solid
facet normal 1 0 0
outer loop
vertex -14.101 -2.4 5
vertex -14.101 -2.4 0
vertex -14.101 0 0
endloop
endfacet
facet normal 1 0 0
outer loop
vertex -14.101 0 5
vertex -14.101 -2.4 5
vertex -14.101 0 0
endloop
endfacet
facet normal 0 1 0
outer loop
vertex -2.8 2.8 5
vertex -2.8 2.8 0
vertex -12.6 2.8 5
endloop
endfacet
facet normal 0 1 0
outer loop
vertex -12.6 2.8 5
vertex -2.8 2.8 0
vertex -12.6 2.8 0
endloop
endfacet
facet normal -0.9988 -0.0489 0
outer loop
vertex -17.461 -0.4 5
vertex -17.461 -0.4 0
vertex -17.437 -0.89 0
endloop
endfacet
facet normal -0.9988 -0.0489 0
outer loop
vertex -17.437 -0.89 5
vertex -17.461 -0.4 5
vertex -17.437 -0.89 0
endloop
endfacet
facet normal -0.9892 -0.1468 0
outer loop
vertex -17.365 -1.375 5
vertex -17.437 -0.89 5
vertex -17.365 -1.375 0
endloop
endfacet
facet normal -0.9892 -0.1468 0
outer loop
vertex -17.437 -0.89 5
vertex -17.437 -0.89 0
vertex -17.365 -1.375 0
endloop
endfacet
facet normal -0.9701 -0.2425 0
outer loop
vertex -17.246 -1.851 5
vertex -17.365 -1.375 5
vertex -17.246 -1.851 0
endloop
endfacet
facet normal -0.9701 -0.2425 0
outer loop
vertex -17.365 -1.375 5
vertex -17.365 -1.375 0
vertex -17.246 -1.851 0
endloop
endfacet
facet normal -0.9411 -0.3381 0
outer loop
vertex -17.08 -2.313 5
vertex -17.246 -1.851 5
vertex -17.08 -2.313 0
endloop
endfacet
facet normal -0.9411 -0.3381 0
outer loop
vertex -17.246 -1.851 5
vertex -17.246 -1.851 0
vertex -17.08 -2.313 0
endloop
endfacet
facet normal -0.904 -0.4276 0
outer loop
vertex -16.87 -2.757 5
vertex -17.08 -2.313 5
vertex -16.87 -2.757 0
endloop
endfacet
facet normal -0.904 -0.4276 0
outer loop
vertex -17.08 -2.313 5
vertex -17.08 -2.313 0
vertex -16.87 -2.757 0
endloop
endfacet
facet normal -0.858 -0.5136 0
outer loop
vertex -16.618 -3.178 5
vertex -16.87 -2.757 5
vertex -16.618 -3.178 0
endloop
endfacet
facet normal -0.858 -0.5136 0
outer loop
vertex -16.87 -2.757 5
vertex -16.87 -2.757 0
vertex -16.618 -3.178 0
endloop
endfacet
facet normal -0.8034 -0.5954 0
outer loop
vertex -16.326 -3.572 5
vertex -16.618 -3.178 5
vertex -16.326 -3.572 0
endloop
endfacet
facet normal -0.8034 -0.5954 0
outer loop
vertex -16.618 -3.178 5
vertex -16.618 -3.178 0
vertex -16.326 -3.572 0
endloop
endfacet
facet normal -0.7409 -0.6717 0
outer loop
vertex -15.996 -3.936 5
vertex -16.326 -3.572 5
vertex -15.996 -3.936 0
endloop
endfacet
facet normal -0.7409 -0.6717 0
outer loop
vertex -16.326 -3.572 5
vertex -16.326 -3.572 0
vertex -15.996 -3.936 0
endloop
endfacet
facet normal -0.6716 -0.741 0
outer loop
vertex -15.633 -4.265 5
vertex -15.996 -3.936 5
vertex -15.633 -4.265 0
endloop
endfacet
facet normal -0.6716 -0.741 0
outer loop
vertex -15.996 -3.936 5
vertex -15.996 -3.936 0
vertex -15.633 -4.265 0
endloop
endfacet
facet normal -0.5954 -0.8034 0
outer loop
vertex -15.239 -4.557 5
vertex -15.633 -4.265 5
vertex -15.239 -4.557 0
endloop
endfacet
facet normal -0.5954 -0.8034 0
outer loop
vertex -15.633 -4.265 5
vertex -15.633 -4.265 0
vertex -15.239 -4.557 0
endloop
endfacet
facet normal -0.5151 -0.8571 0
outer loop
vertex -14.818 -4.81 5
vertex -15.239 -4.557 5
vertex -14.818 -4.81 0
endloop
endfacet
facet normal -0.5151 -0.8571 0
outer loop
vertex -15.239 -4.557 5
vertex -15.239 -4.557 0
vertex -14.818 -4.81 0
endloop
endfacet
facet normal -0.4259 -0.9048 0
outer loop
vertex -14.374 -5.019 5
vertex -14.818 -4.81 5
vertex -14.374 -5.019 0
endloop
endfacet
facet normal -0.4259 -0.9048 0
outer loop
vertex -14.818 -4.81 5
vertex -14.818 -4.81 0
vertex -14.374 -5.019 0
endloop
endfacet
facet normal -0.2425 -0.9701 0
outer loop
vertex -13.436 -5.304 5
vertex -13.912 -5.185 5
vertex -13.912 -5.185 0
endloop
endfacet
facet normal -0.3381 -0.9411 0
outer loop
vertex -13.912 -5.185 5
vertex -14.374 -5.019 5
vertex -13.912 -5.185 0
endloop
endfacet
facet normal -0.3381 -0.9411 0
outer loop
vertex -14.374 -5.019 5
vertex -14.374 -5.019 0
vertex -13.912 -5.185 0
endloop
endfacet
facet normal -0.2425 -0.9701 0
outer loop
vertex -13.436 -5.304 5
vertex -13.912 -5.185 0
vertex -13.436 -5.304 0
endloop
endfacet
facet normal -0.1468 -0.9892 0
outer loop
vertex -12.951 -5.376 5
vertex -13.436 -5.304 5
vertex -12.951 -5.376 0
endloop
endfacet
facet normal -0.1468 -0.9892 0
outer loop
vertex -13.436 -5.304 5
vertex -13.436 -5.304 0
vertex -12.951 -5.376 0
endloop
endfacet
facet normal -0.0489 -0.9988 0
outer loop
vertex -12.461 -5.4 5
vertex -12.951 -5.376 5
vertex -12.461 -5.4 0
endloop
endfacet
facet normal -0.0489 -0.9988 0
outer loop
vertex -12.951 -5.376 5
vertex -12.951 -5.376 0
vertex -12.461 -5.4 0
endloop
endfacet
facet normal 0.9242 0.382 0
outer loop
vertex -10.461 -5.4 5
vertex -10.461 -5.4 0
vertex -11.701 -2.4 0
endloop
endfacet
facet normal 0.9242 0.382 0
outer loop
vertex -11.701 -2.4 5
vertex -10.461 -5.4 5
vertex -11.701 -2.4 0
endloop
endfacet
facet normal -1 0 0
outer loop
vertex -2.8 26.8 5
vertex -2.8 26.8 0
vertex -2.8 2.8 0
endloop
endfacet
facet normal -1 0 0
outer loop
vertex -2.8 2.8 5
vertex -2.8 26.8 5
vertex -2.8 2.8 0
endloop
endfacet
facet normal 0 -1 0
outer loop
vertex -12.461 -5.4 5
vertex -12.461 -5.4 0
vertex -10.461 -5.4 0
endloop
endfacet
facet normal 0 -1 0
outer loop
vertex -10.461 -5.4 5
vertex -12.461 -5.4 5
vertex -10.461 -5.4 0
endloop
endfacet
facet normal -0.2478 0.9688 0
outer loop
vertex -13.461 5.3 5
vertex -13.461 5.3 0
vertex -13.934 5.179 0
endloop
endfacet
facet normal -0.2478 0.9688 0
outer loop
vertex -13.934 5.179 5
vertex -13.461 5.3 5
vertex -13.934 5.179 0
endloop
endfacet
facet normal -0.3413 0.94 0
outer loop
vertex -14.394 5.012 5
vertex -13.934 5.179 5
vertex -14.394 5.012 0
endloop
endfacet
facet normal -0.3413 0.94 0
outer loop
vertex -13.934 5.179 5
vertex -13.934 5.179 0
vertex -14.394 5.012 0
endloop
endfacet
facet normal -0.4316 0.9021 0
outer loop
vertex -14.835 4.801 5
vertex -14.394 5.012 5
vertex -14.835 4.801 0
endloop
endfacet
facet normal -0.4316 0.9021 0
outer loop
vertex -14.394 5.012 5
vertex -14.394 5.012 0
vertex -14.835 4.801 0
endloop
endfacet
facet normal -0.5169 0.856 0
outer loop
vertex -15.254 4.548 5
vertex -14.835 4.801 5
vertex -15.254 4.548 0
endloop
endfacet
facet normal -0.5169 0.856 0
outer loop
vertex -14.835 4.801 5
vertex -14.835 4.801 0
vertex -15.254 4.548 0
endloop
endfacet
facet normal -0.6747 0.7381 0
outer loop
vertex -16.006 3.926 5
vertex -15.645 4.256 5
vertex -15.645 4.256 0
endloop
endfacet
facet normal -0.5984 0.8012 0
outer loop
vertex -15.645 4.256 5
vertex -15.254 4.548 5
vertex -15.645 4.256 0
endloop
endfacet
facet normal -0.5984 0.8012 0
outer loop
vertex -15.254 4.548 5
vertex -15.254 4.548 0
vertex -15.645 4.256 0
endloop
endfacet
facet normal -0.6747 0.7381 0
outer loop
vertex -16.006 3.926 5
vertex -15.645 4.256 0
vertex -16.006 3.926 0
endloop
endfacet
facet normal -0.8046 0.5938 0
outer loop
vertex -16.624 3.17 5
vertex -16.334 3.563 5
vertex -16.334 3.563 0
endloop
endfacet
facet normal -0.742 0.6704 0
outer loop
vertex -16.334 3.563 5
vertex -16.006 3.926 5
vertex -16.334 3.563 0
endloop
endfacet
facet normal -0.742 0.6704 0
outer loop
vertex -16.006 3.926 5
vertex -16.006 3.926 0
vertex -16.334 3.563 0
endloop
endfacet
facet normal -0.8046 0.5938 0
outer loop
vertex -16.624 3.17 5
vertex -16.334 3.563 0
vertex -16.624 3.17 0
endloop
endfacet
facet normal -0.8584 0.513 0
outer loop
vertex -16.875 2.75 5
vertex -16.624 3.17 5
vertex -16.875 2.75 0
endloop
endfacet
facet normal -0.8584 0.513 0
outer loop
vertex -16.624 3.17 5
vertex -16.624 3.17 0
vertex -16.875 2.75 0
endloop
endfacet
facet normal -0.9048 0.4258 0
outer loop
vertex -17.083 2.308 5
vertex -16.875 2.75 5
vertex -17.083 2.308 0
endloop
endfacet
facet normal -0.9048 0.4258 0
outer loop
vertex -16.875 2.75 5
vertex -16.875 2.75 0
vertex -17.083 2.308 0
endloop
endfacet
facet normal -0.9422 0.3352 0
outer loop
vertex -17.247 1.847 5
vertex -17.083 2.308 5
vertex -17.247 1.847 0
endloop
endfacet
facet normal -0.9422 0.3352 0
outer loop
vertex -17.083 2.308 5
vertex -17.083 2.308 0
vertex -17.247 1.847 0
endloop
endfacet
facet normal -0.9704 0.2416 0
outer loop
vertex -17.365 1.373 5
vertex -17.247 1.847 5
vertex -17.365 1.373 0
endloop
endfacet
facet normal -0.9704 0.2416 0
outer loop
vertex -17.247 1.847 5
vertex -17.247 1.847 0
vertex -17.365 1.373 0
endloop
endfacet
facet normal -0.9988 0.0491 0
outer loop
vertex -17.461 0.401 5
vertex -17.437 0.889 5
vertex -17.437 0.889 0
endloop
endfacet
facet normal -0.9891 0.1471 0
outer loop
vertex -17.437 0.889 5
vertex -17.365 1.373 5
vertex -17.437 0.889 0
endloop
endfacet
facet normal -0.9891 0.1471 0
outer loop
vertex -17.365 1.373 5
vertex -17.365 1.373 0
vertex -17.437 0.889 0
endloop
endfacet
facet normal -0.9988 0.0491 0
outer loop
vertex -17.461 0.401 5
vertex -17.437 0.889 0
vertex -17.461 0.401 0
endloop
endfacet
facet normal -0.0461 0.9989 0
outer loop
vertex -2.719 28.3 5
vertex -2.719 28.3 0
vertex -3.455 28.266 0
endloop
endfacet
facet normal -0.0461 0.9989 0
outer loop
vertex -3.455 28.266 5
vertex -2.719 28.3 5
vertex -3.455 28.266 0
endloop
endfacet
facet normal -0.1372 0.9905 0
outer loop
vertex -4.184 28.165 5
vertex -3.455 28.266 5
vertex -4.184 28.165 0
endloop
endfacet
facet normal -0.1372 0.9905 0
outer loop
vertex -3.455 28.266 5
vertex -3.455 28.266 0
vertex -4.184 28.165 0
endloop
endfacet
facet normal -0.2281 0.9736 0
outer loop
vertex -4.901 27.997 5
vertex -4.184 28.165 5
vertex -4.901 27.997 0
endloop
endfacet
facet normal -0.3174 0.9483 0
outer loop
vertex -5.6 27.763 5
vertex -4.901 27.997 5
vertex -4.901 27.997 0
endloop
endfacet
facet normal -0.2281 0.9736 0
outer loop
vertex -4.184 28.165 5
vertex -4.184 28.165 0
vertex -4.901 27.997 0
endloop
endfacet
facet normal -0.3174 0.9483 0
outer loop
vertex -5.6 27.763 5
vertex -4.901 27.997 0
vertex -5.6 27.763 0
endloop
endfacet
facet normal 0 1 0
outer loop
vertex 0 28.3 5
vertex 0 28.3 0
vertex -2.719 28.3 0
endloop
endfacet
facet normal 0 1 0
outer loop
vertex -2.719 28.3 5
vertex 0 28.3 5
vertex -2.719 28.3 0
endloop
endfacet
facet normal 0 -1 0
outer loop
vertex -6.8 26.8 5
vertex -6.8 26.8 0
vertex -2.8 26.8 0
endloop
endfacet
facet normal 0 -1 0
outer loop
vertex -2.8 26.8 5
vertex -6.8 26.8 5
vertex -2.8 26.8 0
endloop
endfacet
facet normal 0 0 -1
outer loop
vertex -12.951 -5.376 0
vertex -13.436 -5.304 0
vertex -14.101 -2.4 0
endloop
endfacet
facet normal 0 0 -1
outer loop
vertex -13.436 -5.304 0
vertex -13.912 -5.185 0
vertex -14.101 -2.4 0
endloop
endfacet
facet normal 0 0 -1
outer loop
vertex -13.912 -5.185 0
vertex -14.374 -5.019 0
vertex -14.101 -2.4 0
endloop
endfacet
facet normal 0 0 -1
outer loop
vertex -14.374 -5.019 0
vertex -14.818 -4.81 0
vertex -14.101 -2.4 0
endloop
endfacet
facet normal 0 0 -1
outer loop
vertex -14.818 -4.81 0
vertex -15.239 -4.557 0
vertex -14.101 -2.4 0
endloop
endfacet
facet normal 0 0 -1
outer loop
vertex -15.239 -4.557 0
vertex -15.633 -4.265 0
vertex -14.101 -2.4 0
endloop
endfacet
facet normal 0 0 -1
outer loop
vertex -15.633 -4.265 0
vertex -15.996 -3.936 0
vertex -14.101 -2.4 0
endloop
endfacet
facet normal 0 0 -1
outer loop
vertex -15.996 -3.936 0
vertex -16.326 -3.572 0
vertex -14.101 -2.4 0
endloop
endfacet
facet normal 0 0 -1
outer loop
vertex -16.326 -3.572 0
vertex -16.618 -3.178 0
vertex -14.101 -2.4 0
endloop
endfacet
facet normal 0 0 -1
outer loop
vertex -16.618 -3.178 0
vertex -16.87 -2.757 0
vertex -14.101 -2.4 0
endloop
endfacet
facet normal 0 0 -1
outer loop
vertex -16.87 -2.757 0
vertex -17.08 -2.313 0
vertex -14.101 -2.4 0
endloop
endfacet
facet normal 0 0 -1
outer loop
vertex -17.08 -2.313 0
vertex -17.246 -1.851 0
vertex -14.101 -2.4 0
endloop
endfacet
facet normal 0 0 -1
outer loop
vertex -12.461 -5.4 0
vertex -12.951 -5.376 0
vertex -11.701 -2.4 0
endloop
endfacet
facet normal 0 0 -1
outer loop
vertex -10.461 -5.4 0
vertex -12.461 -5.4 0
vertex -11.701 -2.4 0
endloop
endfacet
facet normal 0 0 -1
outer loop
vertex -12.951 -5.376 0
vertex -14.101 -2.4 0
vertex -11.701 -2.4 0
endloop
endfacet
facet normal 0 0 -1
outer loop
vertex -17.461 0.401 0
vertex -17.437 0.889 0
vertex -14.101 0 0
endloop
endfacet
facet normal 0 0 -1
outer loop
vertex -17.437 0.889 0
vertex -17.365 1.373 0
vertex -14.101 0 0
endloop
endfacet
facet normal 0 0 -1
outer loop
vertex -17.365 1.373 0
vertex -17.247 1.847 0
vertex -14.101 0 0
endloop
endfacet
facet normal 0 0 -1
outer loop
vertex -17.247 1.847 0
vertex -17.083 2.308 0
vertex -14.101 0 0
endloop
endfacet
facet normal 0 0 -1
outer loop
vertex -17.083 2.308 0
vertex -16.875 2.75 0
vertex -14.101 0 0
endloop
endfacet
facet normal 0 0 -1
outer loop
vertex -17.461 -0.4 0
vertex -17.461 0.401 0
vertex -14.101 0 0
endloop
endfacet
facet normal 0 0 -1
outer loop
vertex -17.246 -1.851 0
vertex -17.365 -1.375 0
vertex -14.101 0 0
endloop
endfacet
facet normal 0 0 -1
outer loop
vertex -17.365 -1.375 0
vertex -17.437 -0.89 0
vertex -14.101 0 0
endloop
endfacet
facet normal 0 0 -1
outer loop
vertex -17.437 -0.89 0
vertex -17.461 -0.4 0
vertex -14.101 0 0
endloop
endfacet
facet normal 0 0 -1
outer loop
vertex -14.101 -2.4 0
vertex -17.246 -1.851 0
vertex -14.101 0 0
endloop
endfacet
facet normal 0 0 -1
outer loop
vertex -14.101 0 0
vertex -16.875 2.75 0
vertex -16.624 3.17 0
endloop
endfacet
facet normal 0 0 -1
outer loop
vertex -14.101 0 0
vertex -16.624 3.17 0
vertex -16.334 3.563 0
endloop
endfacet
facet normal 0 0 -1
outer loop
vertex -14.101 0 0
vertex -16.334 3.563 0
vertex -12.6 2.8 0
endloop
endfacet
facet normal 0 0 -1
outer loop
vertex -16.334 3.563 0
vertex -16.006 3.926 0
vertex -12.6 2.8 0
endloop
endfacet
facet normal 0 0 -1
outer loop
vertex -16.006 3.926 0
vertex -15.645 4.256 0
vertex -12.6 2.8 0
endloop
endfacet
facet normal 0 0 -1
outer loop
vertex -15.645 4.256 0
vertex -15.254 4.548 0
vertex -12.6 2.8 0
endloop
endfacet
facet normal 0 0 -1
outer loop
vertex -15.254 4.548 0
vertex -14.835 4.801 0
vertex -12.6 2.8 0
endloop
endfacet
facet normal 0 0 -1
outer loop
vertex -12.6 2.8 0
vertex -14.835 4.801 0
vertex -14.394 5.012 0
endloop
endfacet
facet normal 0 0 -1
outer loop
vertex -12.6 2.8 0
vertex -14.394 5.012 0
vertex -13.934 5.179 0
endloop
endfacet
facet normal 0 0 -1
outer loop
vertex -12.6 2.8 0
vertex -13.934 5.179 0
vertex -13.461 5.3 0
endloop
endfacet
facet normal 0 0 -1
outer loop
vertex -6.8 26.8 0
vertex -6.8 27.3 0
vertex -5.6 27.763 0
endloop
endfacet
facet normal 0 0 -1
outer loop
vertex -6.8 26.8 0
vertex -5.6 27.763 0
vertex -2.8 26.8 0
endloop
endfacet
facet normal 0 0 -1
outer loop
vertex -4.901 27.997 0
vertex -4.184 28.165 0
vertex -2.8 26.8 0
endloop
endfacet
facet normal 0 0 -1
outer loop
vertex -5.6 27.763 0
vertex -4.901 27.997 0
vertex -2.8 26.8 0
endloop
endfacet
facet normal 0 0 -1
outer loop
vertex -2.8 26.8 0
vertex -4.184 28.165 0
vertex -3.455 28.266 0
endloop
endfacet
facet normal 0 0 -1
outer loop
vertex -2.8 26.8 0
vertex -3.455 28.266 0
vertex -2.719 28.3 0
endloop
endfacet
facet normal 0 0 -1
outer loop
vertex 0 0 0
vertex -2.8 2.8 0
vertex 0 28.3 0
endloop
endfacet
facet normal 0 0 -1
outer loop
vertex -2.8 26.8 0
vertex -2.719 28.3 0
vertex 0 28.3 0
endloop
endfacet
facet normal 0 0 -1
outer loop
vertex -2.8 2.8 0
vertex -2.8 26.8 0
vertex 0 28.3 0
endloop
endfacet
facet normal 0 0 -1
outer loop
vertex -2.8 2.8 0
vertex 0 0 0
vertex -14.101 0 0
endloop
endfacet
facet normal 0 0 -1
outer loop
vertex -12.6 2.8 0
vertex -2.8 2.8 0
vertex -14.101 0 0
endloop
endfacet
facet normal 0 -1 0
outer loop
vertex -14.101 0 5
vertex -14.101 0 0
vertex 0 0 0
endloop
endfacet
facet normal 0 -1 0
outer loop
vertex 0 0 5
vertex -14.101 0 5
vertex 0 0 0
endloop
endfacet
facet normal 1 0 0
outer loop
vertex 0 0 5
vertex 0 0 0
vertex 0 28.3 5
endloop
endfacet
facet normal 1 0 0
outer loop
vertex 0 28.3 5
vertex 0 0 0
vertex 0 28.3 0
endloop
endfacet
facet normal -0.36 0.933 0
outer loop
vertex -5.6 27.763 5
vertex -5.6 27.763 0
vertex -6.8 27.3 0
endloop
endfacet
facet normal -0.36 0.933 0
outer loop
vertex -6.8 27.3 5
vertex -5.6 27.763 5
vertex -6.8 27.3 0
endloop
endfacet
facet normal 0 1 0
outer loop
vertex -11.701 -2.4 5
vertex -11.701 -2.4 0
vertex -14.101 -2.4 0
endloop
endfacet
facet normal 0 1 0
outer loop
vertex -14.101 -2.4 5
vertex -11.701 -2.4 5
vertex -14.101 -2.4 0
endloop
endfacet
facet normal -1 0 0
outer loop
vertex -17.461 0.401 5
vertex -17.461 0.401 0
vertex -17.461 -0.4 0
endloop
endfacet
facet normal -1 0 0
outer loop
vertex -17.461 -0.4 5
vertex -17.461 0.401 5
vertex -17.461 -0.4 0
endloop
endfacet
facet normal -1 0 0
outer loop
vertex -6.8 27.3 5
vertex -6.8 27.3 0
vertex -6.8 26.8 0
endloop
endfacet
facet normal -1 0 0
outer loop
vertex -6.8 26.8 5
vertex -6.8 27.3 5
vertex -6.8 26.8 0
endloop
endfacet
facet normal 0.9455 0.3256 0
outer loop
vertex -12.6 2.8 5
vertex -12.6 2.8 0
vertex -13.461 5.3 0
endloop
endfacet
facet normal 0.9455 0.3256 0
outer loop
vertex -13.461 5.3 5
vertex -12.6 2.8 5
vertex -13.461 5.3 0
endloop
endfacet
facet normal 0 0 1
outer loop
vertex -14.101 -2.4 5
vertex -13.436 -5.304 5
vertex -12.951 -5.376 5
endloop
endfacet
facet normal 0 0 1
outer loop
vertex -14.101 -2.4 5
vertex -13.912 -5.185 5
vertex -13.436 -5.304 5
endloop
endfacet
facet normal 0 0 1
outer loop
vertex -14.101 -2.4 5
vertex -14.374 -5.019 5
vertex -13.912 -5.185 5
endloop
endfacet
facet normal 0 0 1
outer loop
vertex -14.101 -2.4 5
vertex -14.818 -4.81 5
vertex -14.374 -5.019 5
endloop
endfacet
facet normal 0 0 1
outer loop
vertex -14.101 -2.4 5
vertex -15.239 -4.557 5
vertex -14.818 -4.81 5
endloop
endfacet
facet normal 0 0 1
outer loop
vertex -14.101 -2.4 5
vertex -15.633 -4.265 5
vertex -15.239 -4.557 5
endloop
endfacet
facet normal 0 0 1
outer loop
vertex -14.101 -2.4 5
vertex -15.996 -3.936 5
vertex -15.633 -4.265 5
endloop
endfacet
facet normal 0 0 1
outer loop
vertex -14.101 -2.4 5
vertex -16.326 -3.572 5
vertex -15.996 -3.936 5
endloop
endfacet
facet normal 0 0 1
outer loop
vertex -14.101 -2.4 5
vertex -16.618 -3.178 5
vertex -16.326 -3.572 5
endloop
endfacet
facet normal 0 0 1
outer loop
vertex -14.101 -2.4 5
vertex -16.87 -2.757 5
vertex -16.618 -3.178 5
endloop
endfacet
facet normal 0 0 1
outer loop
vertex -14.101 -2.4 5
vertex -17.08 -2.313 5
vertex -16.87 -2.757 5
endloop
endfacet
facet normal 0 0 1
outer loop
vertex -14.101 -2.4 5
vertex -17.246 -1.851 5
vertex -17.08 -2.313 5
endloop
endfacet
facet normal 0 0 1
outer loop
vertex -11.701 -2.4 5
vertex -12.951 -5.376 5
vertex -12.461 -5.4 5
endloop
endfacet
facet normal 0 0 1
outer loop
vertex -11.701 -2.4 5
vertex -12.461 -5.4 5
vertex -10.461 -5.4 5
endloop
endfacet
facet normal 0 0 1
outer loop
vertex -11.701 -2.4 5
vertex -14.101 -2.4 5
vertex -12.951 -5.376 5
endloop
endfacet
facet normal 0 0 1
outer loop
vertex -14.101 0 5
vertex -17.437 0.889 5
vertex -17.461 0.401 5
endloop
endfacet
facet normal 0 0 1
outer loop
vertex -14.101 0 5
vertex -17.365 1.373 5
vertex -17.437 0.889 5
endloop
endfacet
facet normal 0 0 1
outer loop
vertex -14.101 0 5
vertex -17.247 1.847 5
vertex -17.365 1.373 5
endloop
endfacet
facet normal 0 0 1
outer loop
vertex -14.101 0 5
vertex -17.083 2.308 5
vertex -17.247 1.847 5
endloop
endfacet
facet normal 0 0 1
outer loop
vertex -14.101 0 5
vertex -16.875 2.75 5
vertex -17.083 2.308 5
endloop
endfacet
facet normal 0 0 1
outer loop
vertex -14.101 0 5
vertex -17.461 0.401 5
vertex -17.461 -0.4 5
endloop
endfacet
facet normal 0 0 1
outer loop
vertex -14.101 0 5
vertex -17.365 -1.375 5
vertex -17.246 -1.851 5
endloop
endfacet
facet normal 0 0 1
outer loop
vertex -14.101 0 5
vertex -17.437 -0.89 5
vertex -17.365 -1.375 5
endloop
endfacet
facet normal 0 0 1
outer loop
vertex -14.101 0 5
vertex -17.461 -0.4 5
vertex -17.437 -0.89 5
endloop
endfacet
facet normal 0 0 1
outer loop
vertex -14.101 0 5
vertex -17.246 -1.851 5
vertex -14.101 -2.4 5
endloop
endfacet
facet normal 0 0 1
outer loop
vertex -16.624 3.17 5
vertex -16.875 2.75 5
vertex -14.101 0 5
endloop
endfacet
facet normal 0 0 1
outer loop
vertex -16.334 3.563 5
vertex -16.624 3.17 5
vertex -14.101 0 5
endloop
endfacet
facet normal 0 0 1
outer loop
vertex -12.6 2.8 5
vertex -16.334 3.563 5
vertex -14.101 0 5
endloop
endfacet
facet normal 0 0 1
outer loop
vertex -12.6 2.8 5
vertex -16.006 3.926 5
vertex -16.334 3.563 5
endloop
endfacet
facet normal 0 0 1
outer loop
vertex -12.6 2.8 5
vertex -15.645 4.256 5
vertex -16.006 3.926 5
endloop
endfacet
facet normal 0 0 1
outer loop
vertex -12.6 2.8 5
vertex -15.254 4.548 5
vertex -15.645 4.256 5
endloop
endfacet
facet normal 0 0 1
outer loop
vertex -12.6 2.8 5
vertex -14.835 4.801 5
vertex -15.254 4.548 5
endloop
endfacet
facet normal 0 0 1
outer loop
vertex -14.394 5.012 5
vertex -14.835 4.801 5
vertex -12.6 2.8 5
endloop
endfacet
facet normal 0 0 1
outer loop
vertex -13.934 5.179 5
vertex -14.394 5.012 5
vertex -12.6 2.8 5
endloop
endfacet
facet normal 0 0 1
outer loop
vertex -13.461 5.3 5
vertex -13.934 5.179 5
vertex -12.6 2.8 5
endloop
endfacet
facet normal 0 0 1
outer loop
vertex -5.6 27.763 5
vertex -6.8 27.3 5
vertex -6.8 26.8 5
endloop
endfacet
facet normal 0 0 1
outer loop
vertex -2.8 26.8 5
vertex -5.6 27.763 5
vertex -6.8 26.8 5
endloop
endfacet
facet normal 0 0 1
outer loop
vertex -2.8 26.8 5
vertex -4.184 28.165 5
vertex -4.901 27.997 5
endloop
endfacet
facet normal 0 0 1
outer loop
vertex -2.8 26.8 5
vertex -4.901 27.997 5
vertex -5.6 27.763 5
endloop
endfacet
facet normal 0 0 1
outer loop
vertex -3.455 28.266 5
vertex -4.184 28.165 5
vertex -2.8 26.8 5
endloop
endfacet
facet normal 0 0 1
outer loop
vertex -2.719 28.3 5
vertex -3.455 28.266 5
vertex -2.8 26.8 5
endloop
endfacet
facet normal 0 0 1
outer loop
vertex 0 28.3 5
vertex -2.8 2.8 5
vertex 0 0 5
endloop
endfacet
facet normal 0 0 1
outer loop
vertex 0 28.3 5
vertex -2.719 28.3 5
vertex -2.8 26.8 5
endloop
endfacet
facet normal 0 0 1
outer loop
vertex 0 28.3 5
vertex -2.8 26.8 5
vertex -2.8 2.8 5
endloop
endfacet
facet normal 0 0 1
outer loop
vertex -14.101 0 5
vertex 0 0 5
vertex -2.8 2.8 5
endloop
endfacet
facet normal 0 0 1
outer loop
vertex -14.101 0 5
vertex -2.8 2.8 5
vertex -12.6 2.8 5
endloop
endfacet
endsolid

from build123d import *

# Parameters (mm, degrees)
F1_DEPTH    = 5
F2_T1_DEPTH = 29.4948974279
F2_T3_DEPTH = 30


# Not quite as in the source:
# - a fillet or chamfer that OpenCascade refuses, or shapes differently, is made with other operations: its cross-section is extruded or revolved along the edge and cut away or added


with BuildPart() as f1:
    # F0 (on Top) → F1 (new body)
    with BuildSketch(Plane.XY):
        with BuildLine():
            Line((-17.4608190332, -5.4), (-10.4608190332, -5.4))
            Line((-10.4608190332, -5.4), (-11.7008190332, -2.4))
            Line((-11.7008190332, -2.4), (-14.1008190332, -2.4))
            Line((-14.1008190332, -2.4), (-14.1008190332, 0))
            Line((-14.1008190332, 0), (0, 0))
            Line((0, 0), (0, 28.3))
            Line((0, 28.3), (-2.7189972619, 28.3))
            ThreePointArc((-2.7189972619, 28.3), (-4.184287104, 28.1646631001), (-5.6, 27.7632314196))
            Line((-5.6, 27.7632314196), (-6.8, 27.3))
            Line((-6.8, 27.3), (-6.8, 26.8))
            Line((-6.8, 26.8), (-2.8, 26.8))
            Line((-2.8, 26.8), (-2.8, 2.8))
            Line((-2.8, 2.8), (-12.6, 2.8))
            Line((-12.6, 2.8), (-13.4608190332, 5.3))
            Line((-13.4608190332, 5.3), (-17.4608190332, 5.3))
            Line((-17.4608190332, 5.3), (-17.4608190332, -5.4))
        make_face()
    extrude(amount=F1_DEPTH)

    # F2: fillet of radius 5 on 2 edges, made by hand

    # F2_s2 → F2_t1 (cut)
    with BuildSketch(Plane.XY.offset(-12.2474487139)):
        with BuildLine():
            ThreePointArc((-13.4608190332, 5.3), (-16.3338023794, 3.5632981746), (-17.4608190332, 0.4010205144))
            Line((-17.4608190332, 0.4010205144), (-17.4608190332, 5.3))
            Line((-17.4608190332, 5.3), (-13.4608190332, 5.3))
        make_face()
    extrude(amount=F2_T1_DEPTH, mode=Mode.SUBTRACT)

    # F2_s4 → F2_t3 (cut)
    with BuildSketch(Plane.XY.offset(-12.5)):
        with BuildLine():
            ThreePointArc((-17.4608190332, -0.4), (-15.9963529392, -3.9355339059), (-12.4608190332, -5.4))
            Line((-12.4608190332, -5.4), (-17.4608190332, -5.4))
            Line((-17.4608190332, -5.4), (-17.4608190332, -0.4))
        make_face()
    extrude(amount=F2_T3_DEPTH, mode=Mode.SUBTRACT)


solid = f1.part
